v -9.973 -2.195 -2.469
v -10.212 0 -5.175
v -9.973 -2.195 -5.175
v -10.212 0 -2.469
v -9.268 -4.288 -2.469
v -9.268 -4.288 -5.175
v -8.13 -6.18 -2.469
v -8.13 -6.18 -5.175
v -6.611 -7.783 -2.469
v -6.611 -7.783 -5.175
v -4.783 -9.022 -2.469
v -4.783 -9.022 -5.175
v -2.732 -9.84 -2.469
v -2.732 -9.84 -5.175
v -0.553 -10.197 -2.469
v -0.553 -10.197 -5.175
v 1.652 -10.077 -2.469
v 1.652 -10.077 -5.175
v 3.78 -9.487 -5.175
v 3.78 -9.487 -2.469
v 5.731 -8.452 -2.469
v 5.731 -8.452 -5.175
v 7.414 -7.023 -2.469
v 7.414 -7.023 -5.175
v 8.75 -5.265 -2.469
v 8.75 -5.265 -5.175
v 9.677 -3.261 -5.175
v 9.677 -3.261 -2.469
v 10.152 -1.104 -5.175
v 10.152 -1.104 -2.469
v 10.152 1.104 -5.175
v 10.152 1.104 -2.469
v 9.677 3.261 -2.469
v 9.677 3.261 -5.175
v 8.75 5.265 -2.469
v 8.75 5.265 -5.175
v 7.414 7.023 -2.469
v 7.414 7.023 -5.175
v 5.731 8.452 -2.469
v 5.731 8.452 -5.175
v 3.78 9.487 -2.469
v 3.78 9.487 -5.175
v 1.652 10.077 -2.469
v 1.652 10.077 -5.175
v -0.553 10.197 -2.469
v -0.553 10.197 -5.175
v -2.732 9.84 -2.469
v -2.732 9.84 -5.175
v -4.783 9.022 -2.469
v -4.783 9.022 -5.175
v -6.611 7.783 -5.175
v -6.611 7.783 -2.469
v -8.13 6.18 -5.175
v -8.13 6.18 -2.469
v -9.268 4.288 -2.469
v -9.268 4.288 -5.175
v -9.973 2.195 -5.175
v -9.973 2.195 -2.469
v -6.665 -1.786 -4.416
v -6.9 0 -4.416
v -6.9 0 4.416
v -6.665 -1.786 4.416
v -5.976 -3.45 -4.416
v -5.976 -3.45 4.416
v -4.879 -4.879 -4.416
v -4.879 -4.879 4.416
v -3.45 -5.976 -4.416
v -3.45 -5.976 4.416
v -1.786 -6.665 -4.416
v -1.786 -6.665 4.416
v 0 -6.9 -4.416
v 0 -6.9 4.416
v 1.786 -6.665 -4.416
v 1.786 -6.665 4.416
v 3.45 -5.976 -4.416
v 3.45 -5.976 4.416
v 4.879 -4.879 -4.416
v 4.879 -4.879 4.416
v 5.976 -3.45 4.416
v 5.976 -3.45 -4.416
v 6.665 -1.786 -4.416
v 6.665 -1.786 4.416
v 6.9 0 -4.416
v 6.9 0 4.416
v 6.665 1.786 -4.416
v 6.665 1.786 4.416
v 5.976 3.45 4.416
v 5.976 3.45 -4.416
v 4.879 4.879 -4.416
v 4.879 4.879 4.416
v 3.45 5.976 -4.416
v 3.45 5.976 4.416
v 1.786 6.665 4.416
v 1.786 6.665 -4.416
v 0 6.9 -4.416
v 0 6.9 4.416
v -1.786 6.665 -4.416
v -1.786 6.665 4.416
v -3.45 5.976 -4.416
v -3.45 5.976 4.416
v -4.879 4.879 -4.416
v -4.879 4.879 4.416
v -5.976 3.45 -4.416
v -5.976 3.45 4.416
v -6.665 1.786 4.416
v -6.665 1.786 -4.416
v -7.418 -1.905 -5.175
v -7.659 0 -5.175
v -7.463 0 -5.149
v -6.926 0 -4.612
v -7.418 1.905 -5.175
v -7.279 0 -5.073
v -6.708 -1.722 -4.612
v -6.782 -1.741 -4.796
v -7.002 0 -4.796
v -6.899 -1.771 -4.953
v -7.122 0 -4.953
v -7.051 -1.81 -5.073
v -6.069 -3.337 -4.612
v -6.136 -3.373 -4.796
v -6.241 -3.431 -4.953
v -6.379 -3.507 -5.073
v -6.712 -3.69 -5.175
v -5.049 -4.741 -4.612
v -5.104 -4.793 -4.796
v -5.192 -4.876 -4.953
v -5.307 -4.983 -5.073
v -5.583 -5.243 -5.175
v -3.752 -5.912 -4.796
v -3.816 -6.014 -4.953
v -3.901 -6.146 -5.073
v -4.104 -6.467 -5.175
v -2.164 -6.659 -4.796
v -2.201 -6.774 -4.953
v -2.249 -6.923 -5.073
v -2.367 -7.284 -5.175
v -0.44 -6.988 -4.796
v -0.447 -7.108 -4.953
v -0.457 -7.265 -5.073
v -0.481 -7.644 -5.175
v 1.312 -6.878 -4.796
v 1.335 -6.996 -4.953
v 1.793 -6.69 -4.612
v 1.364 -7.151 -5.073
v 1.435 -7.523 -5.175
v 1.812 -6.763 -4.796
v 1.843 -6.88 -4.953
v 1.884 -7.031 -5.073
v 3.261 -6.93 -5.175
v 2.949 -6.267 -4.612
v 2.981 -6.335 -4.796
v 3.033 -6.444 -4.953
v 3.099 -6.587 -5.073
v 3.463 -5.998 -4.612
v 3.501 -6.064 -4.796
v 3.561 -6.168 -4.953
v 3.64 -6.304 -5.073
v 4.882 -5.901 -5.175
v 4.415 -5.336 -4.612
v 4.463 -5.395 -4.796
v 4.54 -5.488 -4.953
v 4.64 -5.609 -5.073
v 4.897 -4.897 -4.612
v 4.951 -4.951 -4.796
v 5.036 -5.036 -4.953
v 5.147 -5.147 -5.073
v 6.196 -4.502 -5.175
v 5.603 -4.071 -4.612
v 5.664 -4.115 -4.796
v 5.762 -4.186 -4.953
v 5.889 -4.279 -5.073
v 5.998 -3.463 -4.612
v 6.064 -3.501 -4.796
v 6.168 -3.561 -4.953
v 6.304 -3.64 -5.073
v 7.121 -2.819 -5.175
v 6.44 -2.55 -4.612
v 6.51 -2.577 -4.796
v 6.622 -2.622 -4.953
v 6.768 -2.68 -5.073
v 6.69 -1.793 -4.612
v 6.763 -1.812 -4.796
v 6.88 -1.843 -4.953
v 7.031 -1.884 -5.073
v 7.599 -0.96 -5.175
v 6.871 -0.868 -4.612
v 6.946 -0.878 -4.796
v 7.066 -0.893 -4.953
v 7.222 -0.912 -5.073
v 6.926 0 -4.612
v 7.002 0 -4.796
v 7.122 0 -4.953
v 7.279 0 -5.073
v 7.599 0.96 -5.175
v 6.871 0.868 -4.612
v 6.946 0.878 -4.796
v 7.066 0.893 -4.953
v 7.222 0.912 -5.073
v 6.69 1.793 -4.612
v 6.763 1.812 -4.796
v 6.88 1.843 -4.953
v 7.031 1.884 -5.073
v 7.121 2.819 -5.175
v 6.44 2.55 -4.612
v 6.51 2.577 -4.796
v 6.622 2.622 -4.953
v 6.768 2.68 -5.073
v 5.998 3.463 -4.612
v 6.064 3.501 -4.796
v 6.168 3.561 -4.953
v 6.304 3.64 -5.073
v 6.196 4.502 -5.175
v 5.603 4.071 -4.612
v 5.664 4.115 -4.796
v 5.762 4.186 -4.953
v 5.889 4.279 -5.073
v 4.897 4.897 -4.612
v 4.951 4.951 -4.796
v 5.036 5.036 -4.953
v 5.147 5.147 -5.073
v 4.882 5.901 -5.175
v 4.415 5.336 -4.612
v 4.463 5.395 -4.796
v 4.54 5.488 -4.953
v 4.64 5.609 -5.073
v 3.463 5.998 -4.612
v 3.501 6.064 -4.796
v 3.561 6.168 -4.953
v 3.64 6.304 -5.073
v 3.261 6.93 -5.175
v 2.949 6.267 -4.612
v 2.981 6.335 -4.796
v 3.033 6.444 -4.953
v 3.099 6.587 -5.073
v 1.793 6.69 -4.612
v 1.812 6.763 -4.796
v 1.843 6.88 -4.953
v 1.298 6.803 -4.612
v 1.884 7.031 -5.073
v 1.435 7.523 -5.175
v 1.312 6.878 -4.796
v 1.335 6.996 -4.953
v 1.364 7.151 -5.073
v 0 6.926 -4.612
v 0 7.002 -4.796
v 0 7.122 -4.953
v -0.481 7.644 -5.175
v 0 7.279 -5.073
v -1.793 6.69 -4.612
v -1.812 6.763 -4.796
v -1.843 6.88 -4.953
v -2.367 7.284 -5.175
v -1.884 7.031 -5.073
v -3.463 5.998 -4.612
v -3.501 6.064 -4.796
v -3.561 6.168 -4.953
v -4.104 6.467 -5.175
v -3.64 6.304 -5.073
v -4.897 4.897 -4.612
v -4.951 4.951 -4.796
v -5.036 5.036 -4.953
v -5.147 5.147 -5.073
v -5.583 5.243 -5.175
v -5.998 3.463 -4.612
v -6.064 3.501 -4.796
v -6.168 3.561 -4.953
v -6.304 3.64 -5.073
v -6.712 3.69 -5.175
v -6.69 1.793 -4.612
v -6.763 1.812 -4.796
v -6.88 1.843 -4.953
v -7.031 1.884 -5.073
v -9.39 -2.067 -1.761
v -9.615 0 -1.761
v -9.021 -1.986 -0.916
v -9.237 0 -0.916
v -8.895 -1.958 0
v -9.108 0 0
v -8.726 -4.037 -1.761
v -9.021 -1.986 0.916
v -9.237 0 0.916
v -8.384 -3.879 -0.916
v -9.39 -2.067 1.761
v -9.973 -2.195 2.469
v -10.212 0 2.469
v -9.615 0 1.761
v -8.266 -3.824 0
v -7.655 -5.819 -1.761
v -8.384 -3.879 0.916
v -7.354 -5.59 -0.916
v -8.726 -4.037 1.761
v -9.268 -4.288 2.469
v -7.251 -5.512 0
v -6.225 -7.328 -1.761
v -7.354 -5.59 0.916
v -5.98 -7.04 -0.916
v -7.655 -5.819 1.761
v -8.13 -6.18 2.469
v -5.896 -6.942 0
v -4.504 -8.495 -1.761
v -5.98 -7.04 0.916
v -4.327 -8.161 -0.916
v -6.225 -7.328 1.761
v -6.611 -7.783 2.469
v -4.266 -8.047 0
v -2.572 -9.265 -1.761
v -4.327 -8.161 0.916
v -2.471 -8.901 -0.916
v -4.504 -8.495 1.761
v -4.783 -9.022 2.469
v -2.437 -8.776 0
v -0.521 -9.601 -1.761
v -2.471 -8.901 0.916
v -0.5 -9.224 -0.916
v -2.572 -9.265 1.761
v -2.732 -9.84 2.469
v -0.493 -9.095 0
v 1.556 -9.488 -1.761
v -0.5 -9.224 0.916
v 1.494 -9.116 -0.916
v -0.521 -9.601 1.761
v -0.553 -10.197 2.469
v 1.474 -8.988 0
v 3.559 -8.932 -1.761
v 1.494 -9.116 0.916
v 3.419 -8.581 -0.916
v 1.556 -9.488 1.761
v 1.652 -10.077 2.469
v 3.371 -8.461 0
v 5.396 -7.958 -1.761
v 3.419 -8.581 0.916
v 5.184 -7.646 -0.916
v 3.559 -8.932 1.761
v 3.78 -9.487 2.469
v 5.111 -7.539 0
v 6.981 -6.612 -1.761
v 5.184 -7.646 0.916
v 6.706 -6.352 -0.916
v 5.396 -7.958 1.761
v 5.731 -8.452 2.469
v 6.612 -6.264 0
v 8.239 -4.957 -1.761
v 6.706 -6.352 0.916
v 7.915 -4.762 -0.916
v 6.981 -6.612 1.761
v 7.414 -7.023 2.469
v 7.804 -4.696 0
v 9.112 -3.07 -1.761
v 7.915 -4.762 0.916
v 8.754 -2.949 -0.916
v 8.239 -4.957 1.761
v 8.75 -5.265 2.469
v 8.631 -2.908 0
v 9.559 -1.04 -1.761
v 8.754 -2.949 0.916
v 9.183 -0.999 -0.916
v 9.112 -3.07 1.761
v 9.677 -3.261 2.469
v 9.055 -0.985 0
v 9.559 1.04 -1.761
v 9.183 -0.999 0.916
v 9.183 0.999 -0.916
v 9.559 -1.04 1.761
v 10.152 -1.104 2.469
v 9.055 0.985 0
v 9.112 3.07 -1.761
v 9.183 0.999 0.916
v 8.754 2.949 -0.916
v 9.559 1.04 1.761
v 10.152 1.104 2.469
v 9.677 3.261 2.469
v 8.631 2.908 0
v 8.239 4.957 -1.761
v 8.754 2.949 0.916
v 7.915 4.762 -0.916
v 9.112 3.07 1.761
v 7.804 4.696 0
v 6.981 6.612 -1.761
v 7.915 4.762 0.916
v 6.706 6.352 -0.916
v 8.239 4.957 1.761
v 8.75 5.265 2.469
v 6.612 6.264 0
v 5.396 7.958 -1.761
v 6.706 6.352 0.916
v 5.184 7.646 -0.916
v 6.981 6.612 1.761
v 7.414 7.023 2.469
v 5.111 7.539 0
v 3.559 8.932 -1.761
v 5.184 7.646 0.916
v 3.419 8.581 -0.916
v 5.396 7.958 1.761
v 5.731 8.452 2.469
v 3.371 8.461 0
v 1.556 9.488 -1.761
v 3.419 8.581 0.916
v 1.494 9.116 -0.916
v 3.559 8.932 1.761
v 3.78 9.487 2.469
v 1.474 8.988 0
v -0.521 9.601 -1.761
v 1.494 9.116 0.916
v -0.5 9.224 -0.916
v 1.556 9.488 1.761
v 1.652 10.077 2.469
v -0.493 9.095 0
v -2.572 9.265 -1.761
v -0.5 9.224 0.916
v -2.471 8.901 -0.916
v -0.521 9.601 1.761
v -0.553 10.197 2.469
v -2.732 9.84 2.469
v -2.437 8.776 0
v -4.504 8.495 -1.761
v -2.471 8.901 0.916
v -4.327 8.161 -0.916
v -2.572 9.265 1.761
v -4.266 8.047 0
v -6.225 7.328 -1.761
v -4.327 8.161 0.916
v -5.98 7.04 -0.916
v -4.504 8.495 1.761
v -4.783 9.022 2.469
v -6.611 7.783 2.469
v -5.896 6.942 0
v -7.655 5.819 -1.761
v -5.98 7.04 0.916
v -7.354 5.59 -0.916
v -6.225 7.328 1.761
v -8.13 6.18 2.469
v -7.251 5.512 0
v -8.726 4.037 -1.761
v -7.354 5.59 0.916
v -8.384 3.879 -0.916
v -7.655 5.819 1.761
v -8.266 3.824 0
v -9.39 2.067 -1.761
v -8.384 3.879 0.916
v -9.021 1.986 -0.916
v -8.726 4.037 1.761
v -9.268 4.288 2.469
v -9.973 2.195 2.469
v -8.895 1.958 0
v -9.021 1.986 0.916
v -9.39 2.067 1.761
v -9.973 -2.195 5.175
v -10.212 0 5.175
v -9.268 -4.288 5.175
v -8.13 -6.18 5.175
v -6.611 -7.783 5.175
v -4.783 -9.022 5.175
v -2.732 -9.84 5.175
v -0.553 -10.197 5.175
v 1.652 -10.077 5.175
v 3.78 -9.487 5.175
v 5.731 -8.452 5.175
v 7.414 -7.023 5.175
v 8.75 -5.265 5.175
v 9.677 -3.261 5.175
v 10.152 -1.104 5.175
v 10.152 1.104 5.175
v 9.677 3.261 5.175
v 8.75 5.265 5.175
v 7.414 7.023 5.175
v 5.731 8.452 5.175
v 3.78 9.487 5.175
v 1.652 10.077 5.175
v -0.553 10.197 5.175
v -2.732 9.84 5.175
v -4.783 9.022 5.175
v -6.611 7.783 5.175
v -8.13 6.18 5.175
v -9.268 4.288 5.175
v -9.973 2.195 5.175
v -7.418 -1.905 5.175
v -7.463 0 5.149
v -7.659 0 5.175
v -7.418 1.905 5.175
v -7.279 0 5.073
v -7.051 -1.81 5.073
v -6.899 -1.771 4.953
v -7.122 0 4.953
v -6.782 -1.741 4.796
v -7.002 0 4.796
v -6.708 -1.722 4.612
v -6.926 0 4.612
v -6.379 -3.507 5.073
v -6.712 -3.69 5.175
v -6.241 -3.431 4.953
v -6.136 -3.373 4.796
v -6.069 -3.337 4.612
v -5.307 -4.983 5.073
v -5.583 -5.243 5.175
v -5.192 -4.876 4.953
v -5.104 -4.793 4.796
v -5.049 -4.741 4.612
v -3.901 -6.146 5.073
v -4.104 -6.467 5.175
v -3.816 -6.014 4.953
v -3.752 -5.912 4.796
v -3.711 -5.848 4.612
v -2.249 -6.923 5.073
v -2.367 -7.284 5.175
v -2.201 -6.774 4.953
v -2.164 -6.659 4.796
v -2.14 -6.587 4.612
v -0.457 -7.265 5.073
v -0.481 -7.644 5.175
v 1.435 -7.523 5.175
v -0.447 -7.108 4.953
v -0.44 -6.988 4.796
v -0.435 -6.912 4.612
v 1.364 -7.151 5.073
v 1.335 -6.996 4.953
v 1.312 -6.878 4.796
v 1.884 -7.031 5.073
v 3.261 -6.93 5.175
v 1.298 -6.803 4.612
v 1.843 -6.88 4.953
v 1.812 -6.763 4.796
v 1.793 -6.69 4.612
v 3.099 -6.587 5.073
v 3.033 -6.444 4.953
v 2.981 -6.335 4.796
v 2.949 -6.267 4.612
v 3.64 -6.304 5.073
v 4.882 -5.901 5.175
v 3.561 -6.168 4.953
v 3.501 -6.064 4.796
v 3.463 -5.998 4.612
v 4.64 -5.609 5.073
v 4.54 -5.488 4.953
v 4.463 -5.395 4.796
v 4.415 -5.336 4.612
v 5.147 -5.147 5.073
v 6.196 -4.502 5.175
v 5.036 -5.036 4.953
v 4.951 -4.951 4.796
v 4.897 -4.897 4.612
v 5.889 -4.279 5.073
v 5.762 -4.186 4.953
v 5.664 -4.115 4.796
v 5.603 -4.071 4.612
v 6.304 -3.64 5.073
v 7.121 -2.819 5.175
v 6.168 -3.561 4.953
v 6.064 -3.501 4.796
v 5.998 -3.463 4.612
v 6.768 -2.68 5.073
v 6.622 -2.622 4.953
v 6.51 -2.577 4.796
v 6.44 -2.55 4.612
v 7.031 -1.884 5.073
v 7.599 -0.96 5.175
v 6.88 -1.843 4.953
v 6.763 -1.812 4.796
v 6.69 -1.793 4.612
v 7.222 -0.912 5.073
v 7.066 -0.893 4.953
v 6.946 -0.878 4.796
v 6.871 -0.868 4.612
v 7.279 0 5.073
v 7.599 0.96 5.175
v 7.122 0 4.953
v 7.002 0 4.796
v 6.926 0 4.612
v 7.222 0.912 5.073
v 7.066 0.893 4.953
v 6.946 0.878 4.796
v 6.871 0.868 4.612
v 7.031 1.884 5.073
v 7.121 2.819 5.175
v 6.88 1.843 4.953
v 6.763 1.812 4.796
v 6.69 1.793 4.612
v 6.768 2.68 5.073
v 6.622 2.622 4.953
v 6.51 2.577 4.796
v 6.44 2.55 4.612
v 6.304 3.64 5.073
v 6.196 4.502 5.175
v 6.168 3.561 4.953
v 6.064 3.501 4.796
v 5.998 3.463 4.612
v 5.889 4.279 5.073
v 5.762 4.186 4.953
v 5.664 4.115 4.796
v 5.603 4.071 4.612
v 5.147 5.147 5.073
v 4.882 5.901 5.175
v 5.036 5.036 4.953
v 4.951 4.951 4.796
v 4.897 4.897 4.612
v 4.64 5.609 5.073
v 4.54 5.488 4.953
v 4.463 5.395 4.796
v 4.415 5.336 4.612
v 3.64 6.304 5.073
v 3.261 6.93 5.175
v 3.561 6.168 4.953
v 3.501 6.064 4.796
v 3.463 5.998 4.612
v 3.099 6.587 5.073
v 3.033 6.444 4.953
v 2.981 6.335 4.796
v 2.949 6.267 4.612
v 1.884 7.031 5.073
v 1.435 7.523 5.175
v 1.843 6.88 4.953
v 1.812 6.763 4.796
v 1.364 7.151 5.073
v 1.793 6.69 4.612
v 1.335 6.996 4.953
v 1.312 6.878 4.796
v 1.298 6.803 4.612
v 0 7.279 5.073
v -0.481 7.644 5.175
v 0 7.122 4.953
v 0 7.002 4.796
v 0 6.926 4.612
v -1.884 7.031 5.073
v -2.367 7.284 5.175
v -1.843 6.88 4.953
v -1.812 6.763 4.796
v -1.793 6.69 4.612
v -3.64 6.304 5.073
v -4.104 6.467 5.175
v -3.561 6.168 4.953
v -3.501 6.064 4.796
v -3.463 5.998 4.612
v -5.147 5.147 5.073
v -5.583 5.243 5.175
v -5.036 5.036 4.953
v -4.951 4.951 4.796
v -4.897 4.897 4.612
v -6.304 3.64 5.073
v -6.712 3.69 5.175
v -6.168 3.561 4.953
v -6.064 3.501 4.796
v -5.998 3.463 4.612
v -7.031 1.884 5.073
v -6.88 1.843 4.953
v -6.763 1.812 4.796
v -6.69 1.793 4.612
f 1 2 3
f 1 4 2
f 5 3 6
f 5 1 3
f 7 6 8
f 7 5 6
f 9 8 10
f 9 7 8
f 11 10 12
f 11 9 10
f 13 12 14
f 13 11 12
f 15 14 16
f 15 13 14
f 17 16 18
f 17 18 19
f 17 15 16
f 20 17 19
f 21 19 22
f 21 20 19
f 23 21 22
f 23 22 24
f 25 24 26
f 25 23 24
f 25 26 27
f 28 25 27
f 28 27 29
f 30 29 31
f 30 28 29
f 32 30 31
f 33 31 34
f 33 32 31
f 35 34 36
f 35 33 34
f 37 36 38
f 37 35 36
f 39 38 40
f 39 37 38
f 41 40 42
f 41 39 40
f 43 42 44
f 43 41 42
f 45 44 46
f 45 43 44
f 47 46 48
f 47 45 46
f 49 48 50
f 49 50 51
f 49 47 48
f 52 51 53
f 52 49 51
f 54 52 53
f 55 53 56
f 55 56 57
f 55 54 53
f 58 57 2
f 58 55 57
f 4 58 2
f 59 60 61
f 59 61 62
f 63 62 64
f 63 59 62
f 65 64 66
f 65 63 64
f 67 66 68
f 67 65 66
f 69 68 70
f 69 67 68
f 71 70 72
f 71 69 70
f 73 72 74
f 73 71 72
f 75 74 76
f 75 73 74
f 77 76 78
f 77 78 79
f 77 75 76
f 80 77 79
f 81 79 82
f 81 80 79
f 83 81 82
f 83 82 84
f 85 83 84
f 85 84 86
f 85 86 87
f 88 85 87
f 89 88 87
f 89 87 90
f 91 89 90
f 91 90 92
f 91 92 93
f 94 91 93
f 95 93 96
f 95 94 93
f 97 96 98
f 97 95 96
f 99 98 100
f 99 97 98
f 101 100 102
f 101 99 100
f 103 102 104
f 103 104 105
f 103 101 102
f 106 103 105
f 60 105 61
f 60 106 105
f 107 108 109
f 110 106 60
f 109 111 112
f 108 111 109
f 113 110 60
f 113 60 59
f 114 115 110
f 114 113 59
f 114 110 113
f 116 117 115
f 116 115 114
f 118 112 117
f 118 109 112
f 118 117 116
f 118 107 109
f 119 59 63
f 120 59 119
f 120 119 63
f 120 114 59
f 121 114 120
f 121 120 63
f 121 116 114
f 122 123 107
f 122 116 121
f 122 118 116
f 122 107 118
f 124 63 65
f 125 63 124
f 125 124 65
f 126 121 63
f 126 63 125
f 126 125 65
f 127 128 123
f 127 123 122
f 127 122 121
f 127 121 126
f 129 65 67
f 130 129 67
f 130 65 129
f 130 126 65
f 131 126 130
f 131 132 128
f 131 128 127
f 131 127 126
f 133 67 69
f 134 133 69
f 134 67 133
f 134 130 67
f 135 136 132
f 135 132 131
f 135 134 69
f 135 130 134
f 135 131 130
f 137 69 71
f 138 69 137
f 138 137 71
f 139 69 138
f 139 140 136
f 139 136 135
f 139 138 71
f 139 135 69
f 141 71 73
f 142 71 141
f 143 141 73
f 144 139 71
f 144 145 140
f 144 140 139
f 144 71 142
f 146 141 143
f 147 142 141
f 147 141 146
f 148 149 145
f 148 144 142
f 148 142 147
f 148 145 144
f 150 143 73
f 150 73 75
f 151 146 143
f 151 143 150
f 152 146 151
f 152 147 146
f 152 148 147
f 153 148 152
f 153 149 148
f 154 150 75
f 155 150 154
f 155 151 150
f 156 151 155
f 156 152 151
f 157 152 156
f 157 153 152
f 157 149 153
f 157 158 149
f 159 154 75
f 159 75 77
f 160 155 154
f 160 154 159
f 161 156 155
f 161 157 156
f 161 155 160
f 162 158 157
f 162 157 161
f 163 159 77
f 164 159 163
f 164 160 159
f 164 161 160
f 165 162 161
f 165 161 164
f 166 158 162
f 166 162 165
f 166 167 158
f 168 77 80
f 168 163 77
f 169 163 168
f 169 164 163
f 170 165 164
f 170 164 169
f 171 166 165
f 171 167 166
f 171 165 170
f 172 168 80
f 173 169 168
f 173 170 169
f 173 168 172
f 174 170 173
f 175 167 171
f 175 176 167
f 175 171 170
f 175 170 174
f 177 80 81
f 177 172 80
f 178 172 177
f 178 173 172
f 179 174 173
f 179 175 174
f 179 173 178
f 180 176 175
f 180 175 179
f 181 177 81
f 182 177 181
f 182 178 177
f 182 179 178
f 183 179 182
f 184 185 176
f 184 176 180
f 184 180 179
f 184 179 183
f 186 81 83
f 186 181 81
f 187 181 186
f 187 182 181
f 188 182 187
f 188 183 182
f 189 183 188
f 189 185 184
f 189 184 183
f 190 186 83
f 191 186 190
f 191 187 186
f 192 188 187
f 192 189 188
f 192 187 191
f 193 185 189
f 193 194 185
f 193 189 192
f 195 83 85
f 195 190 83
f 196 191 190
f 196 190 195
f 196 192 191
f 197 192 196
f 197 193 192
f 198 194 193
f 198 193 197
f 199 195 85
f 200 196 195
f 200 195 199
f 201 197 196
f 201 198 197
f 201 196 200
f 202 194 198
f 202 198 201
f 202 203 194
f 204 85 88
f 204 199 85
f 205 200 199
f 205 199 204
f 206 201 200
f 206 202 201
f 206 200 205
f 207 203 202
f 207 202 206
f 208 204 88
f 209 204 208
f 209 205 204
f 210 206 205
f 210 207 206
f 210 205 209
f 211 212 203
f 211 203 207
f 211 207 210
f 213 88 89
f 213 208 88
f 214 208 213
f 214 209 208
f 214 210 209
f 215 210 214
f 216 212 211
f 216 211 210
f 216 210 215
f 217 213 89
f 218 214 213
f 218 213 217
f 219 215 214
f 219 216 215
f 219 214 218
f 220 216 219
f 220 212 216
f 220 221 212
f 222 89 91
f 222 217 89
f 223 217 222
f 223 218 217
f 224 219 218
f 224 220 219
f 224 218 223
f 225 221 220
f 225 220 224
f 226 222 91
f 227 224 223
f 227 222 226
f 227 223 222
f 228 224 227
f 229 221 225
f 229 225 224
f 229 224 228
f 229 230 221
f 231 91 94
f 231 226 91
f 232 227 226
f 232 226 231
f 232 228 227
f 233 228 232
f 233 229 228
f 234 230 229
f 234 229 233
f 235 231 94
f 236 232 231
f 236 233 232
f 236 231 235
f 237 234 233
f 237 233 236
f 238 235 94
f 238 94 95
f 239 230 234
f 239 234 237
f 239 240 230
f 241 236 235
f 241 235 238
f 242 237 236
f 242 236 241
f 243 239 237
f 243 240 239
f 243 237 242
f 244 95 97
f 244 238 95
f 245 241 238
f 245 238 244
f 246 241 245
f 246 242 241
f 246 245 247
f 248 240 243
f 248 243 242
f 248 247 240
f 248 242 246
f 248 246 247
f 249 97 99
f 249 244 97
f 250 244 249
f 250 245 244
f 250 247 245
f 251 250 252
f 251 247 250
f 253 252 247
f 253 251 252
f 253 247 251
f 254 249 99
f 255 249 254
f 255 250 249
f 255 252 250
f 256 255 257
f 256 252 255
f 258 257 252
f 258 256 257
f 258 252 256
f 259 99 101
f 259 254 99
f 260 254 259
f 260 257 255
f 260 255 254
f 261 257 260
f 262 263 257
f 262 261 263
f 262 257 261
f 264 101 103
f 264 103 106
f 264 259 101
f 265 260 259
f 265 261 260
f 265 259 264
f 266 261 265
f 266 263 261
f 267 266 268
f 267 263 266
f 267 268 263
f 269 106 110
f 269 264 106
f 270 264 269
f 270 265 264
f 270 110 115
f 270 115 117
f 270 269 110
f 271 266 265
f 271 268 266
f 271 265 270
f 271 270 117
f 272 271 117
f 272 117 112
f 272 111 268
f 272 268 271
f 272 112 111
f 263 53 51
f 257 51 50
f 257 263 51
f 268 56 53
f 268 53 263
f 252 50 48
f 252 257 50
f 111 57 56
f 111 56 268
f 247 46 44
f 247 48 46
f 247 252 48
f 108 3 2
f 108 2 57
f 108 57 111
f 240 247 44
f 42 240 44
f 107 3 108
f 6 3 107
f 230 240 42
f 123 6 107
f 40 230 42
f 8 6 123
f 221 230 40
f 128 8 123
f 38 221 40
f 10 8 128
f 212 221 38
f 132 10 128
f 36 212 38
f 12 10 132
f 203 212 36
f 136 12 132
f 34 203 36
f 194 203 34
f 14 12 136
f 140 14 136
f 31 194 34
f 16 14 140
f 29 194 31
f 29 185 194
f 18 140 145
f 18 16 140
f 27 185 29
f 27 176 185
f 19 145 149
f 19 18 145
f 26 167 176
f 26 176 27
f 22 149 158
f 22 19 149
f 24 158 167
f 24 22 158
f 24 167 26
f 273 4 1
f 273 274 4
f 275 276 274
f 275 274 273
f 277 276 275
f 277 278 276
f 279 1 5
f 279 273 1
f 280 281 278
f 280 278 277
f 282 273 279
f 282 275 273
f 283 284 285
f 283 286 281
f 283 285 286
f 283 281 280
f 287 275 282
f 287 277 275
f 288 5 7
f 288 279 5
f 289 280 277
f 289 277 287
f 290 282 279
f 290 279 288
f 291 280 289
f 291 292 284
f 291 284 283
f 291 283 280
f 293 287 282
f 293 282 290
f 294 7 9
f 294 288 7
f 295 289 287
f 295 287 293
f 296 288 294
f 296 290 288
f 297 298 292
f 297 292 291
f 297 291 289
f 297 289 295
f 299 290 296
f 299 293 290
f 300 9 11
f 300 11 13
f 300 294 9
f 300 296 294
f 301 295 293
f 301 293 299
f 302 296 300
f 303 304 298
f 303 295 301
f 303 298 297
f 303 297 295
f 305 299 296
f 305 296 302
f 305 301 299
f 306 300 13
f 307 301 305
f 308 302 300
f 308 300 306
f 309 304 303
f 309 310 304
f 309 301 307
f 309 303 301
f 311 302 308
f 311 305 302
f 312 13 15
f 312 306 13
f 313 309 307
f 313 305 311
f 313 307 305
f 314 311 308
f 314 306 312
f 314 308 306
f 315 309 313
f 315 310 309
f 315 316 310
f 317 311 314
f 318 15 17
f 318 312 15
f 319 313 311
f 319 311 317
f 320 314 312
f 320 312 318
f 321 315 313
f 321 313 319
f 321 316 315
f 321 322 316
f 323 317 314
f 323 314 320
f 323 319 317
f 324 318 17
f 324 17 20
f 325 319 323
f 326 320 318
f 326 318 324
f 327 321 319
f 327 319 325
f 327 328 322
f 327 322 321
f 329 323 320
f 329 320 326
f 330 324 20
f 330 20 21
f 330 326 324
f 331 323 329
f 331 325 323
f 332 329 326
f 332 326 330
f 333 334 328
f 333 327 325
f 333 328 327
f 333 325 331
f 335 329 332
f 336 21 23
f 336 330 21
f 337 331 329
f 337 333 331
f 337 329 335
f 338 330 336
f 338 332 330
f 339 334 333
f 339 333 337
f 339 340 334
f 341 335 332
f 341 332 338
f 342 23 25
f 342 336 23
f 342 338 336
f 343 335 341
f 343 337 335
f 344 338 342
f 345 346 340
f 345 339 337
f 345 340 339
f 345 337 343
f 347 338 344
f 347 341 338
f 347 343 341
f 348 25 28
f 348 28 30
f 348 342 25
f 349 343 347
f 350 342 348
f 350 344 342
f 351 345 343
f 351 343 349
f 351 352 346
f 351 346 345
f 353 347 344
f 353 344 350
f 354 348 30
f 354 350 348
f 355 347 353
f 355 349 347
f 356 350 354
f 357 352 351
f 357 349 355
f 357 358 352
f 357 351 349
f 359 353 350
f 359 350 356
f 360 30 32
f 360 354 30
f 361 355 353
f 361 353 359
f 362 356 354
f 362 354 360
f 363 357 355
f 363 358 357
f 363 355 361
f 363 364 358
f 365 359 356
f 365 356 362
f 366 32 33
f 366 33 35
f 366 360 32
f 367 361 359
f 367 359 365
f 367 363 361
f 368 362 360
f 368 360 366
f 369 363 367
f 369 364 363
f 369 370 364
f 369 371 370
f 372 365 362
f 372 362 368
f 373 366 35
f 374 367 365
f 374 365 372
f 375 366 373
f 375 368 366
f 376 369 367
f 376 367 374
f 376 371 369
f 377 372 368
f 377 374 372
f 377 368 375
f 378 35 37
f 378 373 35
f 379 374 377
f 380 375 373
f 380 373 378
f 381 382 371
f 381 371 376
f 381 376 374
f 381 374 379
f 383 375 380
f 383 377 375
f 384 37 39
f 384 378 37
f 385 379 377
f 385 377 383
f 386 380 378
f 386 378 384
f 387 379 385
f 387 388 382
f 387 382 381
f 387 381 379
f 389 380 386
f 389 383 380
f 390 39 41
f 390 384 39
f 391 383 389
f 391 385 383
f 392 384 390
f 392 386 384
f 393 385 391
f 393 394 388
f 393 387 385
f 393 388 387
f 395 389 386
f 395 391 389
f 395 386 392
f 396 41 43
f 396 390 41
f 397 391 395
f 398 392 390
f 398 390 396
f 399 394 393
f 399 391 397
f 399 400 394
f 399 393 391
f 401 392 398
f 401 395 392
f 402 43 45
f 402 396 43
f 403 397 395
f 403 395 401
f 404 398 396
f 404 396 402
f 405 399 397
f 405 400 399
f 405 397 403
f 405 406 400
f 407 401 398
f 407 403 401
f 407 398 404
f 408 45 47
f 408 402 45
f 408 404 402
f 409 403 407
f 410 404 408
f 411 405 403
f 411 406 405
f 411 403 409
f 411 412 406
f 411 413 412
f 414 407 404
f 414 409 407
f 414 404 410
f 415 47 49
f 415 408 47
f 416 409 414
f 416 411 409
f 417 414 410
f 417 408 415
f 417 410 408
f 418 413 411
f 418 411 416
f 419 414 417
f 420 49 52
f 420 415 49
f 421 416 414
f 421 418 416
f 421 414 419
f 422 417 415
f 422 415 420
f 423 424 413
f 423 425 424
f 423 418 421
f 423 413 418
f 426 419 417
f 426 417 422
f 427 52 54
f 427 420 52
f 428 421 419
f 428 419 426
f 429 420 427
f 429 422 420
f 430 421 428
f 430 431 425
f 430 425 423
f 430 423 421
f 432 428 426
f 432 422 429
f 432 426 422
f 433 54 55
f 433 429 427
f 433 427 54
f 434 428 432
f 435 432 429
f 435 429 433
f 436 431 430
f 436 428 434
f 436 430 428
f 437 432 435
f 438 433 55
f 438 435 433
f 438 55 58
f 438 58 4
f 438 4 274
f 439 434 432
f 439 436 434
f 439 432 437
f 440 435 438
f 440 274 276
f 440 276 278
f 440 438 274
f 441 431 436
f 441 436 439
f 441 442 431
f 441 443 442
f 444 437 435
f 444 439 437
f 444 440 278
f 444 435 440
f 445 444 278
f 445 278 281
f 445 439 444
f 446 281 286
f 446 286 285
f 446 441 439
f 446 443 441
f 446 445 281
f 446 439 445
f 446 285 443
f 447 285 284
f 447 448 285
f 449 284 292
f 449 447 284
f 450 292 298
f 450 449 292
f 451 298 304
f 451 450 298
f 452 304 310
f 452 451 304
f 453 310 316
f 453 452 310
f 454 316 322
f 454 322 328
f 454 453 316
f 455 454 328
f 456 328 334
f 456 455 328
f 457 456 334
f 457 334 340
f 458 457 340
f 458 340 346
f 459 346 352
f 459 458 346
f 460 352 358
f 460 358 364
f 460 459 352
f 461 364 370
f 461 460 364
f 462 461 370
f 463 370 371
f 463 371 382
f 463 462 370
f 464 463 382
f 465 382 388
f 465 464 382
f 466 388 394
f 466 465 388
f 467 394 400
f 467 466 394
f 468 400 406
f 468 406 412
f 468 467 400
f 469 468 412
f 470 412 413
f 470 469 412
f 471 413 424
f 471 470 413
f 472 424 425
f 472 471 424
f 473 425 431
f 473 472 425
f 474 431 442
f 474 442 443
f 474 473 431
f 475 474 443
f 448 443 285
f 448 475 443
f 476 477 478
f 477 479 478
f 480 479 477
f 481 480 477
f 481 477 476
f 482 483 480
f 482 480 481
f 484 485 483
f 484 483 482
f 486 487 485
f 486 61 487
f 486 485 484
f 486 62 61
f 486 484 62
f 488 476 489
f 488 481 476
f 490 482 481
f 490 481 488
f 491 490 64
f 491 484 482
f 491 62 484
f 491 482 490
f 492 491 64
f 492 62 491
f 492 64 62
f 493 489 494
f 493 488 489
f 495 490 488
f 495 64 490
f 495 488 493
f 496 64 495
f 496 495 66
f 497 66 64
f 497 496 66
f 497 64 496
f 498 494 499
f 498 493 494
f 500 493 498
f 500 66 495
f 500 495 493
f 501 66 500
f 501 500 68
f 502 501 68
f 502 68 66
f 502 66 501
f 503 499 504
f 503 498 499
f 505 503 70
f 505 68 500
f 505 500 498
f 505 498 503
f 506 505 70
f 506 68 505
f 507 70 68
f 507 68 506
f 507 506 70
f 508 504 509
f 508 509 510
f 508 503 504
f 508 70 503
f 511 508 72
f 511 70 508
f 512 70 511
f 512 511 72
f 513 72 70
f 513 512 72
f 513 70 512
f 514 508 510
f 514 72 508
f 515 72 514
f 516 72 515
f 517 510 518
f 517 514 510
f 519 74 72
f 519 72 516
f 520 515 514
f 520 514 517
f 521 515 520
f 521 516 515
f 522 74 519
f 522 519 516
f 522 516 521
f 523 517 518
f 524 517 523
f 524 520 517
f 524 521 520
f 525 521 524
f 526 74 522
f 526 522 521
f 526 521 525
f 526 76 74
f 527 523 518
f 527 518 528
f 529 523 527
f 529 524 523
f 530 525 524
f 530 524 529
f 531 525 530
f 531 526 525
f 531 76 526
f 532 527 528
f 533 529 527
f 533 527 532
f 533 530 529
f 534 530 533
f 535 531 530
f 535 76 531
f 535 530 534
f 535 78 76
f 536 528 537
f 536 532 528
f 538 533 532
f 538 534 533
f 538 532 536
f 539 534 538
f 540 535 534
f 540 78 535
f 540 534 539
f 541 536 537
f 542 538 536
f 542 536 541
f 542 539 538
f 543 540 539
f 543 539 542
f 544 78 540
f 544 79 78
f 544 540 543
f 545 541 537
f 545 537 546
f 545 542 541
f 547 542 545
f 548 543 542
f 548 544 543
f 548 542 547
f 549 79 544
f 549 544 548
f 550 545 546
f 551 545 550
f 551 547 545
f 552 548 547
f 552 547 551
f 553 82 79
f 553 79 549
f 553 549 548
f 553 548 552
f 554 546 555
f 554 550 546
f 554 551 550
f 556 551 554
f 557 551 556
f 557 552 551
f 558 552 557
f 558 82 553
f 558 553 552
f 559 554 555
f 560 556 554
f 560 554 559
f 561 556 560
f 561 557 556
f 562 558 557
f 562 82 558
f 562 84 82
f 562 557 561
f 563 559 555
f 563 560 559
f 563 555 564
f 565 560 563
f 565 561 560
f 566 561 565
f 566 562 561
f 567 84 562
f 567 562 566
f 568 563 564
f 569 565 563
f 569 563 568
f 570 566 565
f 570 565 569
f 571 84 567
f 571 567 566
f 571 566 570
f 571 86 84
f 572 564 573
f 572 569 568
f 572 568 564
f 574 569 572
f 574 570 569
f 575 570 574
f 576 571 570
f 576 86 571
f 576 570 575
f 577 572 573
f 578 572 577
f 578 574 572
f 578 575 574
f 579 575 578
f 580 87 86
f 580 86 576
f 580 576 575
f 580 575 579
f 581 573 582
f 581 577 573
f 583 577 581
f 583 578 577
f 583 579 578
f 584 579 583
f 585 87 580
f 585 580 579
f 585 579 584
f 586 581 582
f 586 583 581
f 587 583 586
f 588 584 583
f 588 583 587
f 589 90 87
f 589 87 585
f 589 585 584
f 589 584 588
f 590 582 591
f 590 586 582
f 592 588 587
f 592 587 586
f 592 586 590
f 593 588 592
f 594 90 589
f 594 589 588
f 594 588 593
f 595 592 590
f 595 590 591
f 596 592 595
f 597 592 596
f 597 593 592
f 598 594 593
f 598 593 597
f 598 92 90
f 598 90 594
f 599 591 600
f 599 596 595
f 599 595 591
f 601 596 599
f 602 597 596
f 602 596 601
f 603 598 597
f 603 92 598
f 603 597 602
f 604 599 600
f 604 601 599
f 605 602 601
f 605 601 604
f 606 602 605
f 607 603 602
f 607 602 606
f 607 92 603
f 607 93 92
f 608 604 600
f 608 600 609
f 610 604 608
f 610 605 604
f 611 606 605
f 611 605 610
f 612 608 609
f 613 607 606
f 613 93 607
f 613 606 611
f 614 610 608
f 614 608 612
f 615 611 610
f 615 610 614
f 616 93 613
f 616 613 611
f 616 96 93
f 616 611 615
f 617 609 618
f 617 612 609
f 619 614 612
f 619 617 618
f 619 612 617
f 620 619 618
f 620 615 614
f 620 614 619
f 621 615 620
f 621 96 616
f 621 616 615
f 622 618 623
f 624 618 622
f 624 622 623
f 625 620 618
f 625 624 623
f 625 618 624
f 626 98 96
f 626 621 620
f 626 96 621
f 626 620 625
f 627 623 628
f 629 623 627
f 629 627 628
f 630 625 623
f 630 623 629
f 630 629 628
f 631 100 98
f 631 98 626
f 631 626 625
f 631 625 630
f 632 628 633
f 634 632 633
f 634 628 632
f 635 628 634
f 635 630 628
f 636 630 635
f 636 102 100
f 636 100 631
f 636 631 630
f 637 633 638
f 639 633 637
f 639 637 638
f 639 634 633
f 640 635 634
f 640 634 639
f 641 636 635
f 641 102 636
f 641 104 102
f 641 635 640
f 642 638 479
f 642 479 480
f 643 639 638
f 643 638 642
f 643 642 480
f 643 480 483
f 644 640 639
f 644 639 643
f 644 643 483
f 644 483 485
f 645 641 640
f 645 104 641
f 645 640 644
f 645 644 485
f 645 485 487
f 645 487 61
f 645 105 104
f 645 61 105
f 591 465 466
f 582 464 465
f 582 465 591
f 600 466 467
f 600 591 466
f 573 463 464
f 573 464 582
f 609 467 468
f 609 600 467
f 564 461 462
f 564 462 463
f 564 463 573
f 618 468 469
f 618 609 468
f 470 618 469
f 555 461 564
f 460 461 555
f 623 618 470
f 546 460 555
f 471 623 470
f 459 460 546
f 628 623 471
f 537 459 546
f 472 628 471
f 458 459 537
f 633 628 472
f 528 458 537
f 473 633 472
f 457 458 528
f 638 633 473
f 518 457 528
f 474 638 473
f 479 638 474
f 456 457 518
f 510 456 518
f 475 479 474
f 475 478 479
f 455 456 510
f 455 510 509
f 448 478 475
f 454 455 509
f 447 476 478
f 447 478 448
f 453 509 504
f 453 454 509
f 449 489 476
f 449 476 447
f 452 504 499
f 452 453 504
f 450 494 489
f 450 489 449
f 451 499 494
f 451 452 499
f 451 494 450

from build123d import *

# Parameters (mm, degrees)
CONG_1_R       = 1.1
ECHELLE1_SCALE = 0.69


with BuildPart() as part:
    # Esquisse2 → Révolution1 (revolve)
    with BuildSketch(Plane(origin=(0, 0, 0), x_dir=(0, 0, -1), z_dir=(1, 0, 0)), mode=Mode.PRIVATE) as r_volution1_sk:
        with BuildLine():
            Line((-7.5, 14.8), (-7.5, 10))
            Line((-7.5, 10), (7.5, 10))
            Line((7.5, 10), (7.5, 14.8))
            Line((7.5, 14.8), (3.577708764, 14.8))
            ThreePointArc((3.577708764, 14.8), (0, 13.2), (-3.577708764, 14.8))
            Line((-3.577708764, 14.8), (-7.5, 14.8))
        make_face()
    revolve(r_volution1_sk.sketch.rotate(Axis((0, 0, 0), (0, 0, 1)), 90), axis=Axis((0, 0, 0), (0, 0, 1)))

    # Congé1
    cong_1_edges = [part.edges().sort_by_distance(p)[0] for p in [
        (10, 0, -7.5),
        (10, 0, 7.5),
    ]]
    fillet(cong_1_edges, radius=CONG_1_R)


with BuildPart() as part_1:
    # Echelle1: scaled about (0, 0, 0)
    add(part.part.scale(ECHELLE1_SCALE))


solid = part_1.part
